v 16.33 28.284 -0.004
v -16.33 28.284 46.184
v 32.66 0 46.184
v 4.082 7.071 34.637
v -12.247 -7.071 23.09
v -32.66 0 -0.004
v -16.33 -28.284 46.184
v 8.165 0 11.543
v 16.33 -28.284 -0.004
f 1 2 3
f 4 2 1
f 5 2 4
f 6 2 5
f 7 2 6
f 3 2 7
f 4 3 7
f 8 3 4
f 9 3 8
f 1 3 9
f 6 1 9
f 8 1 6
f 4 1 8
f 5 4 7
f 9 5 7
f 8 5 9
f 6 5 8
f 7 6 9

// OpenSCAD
/*
A toroidal polyhedra from McCooey's "Visual Polyhedra" site - http://dmccooey.com/polyhedra/ 

It is described as:
 A Regular Triangular Toroid with 18 faces (type A) (octahedral form)
   
--------------------
http://dmccooey.com/polyhedra/RegularTriangularToroid18A2.html


Vertices:
9  (9[6])
Faces:
18  (6 equilateral triangles + {6 * 2} obtuse triangles)
Edges:
27  (4 different lengths)
Symmetry:
3-fold Dihedral  (D3)
-------------


PCM April 2018
*/



translate([0,0,23.09])
scale(10)

rotate([0,(acos(-1/3))/2,0])
rotate([0,0,135])
polyhedron(tto_cords,Faces);




//Regular Triangular Toroid with 18 faces (type A) (octahedral form)



tto_cords = [
     [ 4,  0,  0],
     [-4,  0,  0],
     [ 0,  0,  4],
     [ 0,  0, -4],
     [ 0,  4,  0],
     [ 0, -4,  0],
     [ 1,  0,  1],
     [ 0,  1, -1],
     [-1, -1,  0],
    ];

Faces = [
[ 2, 0, 5 ],
[ 5, 0, 6 ],
[ 6, 0, 7 ],
[ 7, 0, 3 ],
[ 3, 0, 4 ],
[ 4, 0, 2 ],
[ 4, 2, 6 ],
[ 6, 2, 8 ],
[ 8, 2, 1 ],
[ 1, 2, 5 ],
[ 1, 5, 3 ],
[ 3, 5, 8 ],
[ 8, 5, 6 ],
[ 4, 6, 7 ],
[ 4, 7, 1 ],
[ 1, 7, 8 ],
[ 8, 7, 3 ],
[ 1, 3, 4 ],
   ];
